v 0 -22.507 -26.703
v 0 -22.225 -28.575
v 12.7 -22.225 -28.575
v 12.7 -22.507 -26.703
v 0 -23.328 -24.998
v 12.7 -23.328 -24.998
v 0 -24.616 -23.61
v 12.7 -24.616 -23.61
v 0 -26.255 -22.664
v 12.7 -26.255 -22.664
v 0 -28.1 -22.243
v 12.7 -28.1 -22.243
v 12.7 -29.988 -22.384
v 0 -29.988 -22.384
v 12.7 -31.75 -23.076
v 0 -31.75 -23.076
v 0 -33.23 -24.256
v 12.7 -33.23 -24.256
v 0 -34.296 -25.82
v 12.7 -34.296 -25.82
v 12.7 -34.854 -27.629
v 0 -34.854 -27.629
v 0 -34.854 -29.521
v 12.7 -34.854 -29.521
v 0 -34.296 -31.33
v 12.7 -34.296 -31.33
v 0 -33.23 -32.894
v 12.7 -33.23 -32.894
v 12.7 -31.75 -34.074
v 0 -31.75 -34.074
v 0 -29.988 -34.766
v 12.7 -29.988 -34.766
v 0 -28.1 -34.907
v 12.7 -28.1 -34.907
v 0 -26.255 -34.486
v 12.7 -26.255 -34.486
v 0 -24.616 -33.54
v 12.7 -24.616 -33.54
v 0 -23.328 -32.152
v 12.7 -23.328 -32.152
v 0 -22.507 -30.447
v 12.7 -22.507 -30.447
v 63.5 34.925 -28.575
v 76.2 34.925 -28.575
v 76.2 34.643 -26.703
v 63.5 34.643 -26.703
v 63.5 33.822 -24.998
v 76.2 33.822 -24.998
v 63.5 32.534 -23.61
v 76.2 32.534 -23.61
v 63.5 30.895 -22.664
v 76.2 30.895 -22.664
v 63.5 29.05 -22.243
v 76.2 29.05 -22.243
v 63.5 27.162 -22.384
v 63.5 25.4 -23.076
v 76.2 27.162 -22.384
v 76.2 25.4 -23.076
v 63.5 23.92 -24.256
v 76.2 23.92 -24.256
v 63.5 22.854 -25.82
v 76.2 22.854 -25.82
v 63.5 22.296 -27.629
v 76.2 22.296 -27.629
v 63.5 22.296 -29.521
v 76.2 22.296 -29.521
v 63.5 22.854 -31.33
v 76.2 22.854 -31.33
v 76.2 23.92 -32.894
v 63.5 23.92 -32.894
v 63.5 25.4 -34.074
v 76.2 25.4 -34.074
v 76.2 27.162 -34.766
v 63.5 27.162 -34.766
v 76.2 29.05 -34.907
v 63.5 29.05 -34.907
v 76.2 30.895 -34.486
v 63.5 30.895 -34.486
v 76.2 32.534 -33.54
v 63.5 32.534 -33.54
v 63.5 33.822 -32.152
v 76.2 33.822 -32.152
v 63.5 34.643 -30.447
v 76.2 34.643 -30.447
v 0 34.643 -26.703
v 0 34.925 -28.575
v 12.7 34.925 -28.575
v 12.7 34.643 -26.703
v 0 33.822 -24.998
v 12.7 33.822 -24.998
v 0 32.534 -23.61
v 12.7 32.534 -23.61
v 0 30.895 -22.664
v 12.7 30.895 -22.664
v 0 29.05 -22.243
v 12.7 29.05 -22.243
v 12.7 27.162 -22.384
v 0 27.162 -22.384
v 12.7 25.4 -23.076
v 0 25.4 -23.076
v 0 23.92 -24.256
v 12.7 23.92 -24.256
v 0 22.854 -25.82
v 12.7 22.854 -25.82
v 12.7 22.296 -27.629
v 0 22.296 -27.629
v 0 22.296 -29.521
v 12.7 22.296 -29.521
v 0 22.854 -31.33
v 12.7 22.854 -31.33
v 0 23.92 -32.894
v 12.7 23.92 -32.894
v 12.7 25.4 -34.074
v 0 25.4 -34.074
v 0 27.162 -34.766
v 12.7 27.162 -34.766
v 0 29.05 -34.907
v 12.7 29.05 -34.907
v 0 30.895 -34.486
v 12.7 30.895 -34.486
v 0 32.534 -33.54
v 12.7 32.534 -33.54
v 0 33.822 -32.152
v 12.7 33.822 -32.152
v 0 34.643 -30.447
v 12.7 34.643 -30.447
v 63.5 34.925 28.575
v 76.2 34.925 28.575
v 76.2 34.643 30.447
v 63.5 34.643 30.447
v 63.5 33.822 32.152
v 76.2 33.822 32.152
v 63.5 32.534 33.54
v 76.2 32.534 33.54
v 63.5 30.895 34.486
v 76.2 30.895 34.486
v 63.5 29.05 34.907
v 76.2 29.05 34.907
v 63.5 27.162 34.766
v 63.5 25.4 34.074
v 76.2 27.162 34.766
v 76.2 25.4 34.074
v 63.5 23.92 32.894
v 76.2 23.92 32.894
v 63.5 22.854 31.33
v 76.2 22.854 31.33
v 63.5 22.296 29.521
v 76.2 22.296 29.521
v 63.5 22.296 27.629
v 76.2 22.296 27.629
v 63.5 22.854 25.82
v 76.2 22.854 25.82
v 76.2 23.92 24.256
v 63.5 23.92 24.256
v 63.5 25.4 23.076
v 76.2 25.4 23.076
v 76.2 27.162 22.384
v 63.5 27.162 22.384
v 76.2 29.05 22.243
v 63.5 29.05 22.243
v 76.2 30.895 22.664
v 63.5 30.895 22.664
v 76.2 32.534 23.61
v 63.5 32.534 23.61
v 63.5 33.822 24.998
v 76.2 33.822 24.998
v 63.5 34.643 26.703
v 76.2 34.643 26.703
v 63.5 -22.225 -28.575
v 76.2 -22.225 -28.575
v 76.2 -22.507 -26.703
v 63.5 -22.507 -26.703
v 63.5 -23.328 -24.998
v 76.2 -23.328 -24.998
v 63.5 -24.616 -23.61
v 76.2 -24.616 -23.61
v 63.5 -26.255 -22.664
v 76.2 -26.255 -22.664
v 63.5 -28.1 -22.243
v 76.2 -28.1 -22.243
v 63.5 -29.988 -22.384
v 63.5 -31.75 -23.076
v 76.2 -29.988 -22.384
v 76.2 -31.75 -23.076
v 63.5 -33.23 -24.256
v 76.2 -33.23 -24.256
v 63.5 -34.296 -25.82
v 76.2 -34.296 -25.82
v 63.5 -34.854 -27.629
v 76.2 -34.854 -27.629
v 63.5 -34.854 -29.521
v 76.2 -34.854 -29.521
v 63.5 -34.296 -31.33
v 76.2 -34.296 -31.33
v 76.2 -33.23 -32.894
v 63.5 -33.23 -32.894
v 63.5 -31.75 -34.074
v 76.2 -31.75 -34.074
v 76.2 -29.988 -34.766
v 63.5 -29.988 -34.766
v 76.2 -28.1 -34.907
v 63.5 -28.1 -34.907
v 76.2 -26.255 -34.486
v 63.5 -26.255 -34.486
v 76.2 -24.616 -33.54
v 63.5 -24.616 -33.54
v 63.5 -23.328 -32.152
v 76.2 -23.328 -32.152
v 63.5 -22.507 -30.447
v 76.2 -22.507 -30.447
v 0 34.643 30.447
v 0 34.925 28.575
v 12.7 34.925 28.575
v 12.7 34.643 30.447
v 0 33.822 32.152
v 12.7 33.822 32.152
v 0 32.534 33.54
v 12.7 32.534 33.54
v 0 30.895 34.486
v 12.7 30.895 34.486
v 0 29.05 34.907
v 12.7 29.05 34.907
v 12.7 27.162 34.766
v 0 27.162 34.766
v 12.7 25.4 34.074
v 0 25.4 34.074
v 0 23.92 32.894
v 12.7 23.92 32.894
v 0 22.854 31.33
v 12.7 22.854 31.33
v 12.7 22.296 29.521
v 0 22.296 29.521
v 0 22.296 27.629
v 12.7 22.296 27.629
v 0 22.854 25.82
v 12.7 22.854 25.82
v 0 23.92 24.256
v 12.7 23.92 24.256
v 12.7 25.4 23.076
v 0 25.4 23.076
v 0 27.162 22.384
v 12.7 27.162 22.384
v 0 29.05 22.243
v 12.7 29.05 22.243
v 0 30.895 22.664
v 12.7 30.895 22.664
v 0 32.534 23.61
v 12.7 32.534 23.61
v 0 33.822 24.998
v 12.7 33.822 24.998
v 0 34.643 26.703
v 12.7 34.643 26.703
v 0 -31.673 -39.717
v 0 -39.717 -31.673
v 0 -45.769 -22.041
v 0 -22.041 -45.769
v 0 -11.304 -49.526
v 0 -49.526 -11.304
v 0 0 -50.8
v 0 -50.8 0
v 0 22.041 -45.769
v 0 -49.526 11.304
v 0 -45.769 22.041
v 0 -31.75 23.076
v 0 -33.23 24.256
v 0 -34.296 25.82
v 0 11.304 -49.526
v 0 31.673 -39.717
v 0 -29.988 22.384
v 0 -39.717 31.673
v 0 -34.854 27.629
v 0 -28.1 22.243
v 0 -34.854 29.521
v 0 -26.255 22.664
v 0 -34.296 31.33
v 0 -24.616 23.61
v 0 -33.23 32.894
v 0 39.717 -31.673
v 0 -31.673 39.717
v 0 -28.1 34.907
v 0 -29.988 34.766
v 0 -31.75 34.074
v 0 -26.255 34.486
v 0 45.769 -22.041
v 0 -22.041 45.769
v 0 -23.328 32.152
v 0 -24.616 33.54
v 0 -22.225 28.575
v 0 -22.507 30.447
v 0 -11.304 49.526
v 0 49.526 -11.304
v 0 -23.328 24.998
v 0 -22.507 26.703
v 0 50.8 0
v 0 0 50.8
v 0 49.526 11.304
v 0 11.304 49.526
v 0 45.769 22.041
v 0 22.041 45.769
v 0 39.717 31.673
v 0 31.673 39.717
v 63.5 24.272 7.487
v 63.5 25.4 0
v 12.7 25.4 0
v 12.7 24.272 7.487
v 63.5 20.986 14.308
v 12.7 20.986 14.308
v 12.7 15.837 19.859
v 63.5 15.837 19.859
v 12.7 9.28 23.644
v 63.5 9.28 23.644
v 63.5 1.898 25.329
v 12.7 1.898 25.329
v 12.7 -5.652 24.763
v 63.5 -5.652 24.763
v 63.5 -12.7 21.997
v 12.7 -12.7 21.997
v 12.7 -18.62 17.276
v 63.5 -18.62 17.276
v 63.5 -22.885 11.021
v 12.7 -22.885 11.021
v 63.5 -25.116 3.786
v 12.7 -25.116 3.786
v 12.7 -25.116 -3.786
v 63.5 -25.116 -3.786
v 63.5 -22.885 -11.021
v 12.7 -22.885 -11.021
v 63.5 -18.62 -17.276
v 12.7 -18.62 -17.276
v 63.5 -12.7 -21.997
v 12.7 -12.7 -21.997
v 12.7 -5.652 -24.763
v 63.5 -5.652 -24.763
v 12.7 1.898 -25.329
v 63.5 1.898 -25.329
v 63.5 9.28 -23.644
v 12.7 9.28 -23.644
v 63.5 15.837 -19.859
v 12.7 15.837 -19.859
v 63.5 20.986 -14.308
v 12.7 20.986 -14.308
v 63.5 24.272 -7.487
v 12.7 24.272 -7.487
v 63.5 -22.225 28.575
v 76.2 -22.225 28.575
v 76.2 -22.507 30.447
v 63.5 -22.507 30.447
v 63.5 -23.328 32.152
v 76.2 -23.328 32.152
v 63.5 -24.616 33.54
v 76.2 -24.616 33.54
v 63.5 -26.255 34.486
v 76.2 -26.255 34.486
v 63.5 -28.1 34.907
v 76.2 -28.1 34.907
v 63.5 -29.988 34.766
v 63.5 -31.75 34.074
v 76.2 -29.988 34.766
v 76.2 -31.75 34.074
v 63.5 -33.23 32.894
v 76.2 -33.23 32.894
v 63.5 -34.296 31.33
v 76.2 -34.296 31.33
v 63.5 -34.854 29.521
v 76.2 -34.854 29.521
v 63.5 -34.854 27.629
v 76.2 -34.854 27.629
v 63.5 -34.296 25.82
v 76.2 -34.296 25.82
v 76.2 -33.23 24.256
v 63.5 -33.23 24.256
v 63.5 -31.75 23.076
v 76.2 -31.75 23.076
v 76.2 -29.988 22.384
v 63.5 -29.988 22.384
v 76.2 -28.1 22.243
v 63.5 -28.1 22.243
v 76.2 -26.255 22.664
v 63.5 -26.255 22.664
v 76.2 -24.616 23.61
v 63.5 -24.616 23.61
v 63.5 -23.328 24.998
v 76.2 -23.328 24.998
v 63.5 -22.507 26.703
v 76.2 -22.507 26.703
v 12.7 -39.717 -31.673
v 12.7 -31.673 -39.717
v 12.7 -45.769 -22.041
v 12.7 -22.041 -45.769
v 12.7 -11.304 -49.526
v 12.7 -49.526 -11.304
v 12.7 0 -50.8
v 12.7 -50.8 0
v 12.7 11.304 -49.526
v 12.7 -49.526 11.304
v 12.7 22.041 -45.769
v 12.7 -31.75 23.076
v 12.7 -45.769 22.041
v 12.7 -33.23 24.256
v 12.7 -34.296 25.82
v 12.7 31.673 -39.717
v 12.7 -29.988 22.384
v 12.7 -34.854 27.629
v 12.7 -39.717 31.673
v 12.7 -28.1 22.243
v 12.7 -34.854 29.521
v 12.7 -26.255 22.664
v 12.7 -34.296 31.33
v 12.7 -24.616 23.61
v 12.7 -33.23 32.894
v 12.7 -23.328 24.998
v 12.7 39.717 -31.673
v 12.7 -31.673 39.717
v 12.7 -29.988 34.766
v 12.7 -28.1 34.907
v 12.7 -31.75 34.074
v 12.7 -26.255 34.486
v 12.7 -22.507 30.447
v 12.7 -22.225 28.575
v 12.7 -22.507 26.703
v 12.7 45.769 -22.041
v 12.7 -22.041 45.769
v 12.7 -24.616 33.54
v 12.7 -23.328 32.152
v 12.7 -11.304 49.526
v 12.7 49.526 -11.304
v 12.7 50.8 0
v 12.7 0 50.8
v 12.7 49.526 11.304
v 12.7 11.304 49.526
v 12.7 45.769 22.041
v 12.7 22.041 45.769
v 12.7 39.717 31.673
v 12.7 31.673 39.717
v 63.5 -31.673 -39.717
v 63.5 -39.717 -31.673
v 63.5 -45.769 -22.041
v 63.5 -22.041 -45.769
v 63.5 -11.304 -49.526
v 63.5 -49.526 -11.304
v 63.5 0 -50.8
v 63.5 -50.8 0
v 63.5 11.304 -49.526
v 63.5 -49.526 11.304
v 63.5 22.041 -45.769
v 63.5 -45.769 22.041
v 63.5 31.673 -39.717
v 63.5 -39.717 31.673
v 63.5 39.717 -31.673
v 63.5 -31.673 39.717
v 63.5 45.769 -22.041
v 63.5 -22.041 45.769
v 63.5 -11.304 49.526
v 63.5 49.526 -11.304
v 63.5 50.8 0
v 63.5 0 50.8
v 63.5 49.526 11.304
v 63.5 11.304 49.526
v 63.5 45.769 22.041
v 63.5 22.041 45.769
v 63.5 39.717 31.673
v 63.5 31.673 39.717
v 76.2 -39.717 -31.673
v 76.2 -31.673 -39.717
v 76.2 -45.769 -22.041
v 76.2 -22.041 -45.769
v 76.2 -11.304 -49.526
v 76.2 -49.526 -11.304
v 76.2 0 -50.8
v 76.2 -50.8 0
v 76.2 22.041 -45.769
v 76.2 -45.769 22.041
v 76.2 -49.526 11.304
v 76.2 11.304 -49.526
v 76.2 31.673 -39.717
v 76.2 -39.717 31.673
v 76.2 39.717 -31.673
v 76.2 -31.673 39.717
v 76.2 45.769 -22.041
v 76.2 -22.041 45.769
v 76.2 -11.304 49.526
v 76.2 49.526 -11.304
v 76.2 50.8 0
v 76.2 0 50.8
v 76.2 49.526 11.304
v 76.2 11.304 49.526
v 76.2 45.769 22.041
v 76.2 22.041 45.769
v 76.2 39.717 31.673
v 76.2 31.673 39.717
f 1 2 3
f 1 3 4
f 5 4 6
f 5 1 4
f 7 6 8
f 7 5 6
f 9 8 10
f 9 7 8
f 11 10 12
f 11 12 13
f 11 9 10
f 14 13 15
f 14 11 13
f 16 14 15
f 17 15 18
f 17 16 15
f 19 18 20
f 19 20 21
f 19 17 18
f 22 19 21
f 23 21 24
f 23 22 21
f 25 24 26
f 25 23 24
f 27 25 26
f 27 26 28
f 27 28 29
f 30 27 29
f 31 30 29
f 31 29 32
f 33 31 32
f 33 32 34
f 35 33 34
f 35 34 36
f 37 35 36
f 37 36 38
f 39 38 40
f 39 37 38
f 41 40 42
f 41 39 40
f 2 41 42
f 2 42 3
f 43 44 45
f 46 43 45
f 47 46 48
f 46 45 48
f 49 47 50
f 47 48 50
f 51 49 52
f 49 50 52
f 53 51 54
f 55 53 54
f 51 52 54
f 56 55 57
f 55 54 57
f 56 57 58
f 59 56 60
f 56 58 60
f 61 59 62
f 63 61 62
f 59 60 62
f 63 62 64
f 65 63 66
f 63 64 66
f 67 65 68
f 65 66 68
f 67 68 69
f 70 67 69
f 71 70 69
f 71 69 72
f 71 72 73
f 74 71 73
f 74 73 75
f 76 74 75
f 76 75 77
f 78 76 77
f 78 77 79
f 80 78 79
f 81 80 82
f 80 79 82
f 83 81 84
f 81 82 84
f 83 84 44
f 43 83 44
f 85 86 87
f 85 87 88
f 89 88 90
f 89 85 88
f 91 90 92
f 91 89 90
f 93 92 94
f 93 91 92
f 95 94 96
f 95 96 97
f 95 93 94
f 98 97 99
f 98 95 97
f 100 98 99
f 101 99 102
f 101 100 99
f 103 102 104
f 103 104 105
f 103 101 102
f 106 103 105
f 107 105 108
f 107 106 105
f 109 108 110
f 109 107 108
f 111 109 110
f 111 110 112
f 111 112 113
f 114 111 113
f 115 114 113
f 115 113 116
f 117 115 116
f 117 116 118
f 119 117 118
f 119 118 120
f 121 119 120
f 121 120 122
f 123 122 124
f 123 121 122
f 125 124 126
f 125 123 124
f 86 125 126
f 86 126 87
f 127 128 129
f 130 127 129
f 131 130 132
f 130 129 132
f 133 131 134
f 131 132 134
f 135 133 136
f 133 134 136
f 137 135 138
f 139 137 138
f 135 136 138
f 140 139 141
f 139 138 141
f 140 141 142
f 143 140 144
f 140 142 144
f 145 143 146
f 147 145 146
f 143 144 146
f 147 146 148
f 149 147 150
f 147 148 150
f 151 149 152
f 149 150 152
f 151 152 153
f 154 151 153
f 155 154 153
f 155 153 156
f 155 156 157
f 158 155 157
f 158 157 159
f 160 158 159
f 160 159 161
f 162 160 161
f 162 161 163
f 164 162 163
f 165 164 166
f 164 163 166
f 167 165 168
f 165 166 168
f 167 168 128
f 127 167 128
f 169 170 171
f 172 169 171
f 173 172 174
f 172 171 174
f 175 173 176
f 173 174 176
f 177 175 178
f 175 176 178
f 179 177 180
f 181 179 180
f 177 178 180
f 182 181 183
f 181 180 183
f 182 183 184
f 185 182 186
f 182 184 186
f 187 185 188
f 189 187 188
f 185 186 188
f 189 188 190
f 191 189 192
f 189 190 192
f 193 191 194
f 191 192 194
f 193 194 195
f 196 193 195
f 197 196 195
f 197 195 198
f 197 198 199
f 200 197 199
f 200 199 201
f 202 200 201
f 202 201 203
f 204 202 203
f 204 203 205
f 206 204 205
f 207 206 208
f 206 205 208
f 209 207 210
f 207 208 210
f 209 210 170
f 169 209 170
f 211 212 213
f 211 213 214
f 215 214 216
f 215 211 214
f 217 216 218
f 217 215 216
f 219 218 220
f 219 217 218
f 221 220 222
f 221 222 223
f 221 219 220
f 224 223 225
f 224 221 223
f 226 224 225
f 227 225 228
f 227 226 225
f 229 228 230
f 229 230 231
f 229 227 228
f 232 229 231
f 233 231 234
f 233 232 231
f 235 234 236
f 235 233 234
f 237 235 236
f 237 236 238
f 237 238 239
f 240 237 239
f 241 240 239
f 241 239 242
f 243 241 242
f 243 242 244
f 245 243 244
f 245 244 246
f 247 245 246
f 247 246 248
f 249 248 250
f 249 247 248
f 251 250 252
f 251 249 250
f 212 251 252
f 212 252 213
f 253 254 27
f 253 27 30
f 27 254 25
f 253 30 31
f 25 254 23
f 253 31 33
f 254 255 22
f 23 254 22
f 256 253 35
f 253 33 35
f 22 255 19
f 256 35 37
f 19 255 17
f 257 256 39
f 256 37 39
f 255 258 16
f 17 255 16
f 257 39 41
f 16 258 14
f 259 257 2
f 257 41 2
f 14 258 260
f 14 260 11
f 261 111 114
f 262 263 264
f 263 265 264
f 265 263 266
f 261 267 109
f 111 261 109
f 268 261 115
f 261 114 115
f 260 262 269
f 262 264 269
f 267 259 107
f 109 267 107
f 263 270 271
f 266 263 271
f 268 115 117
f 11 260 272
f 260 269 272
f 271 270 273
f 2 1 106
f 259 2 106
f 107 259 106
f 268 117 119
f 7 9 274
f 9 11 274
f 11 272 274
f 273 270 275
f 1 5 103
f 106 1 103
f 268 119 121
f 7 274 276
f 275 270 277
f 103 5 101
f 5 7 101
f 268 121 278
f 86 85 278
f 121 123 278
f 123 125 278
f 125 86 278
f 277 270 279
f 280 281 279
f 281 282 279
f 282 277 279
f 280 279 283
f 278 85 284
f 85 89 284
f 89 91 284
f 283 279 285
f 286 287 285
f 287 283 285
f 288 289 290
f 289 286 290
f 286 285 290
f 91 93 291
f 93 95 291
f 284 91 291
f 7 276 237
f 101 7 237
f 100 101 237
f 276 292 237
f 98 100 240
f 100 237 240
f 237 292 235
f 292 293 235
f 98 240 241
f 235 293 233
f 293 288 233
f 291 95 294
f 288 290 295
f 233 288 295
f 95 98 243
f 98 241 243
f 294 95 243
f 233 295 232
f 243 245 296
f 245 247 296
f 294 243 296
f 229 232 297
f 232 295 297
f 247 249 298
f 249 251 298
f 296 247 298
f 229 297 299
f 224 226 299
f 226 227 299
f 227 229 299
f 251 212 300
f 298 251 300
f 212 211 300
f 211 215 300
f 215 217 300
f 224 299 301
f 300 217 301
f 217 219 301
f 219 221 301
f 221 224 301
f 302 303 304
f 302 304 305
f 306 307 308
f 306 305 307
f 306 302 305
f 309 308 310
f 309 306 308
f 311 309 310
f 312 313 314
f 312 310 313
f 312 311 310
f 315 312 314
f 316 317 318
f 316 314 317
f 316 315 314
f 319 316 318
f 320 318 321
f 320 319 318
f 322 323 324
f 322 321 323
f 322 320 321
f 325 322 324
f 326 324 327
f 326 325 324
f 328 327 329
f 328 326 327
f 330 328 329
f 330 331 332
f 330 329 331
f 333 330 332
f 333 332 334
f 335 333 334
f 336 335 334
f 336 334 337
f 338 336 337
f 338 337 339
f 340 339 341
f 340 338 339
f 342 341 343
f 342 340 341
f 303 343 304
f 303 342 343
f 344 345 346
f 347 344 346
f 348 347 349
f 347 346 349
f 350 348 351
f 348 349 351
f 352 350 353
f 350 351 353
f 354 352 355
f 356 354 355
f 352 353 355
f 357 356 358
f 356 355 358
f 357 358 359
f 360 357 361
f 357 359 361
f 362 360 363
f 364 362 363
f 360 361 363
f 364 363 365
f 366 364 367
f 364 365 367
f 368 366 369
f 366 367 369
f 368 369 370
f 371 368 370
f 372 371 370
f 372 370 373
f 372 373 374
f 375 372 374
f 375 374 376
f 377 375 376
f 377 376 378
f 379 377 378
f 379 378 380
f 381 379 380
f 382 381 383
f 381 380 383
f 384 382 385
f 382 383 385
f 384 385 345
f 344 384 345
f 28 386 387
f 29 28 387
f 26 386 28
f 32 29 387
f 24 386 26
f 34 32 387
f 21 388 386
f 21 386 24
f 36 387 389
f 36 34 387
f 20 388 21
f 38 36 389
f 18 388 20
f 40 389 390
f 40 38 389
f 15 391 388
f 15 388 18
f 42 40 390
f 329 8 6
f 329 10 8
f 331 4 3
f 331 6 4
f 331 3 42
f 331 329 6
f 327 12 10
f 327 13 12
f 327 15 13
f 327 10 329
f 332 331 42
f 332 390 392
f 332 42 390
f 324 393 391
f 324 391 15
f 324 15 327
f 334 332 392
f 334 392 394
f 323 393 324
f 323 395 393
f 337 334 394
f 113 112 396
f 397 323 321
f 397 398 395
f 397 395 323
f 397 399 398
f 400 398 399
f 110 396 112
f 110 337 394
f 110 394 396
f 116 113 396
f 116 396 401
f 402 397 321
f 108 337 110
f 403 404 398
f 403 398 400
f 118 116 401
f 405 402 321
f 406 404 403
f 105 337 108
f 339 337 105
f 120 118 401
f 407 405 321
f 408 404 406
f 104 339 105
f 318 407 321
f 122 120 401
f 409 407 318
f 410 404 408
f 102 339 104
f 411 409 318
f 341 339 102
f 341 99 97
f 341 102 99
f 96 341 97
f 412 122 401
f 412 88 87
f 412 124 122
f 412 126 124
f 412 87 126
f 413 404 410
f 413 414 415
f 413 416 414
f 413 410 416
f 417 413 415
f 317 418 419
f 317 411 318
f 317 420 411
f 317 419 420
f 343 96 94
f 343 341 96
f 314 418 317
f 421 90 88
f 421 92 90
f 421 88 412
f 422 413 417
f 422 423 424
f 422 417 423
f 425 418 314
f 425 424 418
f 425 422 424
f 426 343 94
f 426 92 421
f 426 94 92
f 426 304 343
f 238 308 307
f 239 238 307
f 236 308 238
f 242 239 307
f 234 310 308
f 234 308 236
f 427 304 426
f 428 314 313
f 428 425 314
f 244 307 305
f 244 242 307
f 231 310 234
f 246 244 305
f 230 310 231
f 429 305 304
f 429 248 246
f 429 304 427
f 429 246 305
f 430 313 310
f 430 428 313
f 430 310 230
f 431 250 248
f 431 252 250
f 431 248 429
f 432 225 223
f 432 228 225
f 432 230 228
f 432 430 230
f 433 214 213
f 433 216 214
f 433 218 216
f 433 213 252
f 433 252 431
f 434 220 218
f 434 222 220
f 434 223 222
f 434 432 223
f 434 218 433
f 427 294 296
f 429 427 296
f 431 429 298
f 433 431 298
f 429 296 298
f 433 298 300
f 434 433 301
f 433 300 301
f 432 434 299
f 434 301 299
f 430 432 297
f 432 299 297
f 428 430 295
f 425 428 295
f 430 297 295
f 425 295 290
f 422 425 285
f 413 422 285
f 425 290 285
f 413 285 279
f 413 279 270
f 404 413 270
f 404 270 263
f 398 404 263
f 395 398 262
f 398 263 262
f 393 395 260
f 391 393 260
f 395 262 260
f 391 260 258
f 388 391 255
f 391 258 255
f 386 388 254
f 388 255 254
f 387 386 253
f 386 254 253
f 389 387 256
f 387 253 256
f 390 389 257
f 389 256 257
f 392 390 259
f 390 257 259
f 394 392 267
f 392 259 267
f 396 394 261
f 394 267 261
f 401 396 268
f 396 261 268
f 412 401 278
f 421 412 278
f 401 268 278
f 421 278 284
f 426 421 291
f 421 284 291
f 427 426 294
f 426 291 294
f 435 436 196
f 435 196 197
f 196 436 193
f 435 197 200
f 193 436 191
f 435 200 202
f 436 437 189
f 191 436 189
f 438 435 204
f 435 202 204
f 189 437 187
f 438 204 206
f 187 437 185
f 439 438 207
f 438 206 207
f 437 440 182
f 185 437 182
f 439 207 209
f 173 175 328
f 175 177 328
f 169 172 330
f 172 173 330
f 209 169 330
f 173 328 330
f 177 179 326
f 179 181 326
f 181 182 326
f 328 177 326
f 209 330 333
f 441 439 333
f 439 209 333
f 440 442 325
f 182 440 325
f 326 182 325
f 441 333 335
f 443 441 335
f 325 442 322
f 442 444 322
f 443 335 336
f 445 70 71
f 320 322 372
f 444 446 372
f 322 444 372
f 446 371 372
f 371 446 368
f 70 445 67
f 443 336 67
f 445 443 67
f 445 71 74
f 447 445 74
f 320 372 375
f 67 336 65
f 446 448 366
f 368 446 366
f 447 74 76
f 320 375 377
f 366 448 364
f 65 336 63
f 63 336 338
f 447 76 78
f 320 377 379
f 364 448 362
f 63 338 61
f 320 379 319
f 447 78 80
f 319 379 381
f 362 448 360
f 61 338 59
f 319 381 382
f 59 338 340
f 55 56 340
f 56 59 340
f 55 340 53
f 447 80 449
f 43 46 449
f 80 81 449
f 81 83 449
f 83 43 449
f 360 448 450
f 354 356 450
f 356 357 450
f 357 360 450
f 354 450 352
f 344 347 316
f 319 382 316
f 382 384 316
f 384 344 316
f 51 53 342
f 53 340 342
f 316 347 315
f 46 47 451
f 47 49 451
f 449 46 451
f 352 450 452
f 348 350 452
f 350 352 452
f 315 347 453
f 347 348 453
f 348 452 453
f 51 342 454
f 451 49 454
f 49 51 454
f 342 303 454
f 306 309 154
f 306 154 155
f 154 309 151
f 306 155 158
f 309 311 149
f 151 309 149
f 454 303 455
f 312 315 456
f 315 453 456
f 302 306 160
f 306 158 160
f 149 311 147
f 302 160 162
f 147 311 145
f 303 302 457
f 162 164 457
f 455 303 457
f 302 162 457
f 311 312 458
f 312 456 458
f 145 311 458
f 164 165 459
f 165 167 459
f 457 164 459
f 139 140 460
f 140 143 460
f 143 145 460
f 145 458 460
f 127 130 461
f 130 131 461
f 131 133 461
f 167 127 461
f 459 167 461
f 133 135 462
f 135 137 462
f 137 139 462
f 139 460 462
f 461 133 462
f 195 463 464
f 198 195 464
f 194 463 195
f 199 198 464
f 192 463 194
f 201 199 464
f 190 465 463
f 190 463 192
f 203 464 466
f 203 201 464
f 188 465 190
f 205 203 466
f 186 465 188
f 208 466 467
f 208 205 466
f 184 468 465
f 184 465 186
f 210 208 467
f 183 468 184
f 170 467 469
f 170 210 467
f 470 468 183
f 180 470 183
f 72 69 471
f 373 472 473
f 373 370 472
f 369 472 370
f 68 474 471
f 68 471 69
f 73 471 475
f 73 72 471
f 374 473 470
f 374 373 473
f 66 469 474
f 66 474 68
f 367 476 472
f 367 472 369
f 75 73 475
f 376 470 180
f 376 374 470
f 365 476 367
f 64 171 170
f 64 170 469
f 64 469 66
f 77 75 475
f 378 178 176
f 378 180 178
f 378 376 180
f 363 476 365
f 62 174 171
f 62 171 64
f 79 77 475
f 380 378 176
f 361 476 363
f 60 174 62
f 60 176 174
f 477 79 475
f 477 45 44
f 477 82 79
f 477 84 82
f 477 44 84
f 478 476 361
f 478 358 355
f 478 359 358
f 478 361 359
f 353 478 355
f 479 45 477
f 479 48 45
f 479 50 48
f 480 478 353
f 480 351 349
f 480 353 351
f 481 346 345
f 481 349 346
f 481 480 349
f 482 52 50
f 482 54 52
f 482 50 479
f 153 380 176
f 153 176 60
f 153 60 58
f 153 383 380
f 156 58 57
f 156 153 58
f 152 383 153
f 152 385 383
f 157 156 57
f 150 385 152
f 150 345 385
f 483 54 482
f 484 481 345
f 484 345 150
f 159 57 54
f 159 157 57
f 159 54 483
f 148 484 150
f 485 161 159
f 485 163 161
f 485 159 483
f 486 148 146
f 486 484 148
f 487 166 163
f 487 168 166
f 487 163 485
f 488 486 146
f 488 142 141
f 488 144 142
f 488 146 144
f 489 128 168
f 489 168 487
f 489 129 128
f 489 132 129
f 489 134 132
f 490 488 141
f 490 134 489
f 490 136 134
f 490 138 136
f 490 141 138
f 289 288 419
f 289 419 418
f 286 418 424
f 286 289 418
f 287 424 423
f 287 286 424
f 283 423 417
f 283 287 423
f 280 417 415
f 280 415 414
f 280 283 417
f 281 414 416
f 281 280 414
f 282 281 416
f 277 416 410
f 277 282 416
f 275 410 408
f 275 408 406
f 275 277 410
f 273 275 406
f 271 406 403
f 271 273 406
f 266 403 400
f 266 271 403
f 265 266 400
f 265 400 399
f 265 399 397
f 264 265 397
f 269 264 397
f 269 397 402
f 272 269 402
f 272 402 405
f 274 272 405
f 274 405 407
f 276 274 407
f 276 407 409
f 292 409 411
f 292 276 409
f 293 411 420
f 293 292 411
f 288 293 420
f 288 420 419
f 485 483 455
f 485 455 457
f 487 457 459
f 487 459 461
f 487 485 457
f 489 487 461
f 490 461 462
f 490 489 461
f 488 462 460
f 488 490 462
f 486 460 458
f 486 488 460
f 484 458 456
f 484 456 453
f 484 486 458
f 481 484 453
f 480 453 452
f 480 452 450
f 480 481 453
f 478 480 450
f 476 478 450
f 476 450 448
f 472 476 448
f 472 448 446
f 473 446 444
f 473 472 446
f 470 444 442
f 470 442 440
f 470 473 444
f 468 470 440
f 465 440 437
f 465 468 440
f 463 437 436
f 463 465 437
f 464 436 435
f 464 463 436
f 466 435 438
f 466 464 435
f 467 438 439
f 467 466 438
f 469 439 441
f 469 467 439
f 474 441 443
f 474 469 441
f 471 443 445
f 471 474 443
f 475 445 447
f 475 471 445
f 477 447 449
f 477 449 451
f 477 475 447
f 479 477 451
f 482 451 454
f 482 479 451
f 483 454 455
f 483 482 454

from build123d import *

# Parameters (mm, degrees)
F0_R     = 50.8
F0_R_2   = 6.35
F0_R_3   = 19.05
F1_DEPTH = 12.7
F2_R     = 25.4
F3_DEPTH = 38.1


with BuildPart() as f1:
    # F0 (on Right) → F1 (new body)
    with BuildSketch(Plane.YZ):
        Circle(F0_R)
        with Locations((-28.575, -28.575)):
            Circle(F0_R_2, mode=Mode.SUBTRACT)
        Circle(F0_R_3, mode=Mode.SUBTRACT)
        with Locations((28.575, -28.575)):
            Circle(F0_R_2, mode=Mode.SUBTRACT)
        with Locations((-28.575, 28.575)):
            Circle(F0_R_2, mode=Mode.SUBTRACT)
        with Locations((28.575, 28.575)):
            Circle(F0_R_2, mode=Mode.SUBTRACT)
    extrude(amount=F1_DEPTH)

    # F2 (on Right) → F3 (join)
    with BuildSketch(Plane.YZ):
        Circle(F2_R)
    extrude(amount=F3_DEPTH)

    # F4: F1 across face


with BuildPart() as f1_1:
    add(f1.part)
    add(f1.part.mirror(Plane.YZ.offset(38.1)))


solid = f1_1.part
